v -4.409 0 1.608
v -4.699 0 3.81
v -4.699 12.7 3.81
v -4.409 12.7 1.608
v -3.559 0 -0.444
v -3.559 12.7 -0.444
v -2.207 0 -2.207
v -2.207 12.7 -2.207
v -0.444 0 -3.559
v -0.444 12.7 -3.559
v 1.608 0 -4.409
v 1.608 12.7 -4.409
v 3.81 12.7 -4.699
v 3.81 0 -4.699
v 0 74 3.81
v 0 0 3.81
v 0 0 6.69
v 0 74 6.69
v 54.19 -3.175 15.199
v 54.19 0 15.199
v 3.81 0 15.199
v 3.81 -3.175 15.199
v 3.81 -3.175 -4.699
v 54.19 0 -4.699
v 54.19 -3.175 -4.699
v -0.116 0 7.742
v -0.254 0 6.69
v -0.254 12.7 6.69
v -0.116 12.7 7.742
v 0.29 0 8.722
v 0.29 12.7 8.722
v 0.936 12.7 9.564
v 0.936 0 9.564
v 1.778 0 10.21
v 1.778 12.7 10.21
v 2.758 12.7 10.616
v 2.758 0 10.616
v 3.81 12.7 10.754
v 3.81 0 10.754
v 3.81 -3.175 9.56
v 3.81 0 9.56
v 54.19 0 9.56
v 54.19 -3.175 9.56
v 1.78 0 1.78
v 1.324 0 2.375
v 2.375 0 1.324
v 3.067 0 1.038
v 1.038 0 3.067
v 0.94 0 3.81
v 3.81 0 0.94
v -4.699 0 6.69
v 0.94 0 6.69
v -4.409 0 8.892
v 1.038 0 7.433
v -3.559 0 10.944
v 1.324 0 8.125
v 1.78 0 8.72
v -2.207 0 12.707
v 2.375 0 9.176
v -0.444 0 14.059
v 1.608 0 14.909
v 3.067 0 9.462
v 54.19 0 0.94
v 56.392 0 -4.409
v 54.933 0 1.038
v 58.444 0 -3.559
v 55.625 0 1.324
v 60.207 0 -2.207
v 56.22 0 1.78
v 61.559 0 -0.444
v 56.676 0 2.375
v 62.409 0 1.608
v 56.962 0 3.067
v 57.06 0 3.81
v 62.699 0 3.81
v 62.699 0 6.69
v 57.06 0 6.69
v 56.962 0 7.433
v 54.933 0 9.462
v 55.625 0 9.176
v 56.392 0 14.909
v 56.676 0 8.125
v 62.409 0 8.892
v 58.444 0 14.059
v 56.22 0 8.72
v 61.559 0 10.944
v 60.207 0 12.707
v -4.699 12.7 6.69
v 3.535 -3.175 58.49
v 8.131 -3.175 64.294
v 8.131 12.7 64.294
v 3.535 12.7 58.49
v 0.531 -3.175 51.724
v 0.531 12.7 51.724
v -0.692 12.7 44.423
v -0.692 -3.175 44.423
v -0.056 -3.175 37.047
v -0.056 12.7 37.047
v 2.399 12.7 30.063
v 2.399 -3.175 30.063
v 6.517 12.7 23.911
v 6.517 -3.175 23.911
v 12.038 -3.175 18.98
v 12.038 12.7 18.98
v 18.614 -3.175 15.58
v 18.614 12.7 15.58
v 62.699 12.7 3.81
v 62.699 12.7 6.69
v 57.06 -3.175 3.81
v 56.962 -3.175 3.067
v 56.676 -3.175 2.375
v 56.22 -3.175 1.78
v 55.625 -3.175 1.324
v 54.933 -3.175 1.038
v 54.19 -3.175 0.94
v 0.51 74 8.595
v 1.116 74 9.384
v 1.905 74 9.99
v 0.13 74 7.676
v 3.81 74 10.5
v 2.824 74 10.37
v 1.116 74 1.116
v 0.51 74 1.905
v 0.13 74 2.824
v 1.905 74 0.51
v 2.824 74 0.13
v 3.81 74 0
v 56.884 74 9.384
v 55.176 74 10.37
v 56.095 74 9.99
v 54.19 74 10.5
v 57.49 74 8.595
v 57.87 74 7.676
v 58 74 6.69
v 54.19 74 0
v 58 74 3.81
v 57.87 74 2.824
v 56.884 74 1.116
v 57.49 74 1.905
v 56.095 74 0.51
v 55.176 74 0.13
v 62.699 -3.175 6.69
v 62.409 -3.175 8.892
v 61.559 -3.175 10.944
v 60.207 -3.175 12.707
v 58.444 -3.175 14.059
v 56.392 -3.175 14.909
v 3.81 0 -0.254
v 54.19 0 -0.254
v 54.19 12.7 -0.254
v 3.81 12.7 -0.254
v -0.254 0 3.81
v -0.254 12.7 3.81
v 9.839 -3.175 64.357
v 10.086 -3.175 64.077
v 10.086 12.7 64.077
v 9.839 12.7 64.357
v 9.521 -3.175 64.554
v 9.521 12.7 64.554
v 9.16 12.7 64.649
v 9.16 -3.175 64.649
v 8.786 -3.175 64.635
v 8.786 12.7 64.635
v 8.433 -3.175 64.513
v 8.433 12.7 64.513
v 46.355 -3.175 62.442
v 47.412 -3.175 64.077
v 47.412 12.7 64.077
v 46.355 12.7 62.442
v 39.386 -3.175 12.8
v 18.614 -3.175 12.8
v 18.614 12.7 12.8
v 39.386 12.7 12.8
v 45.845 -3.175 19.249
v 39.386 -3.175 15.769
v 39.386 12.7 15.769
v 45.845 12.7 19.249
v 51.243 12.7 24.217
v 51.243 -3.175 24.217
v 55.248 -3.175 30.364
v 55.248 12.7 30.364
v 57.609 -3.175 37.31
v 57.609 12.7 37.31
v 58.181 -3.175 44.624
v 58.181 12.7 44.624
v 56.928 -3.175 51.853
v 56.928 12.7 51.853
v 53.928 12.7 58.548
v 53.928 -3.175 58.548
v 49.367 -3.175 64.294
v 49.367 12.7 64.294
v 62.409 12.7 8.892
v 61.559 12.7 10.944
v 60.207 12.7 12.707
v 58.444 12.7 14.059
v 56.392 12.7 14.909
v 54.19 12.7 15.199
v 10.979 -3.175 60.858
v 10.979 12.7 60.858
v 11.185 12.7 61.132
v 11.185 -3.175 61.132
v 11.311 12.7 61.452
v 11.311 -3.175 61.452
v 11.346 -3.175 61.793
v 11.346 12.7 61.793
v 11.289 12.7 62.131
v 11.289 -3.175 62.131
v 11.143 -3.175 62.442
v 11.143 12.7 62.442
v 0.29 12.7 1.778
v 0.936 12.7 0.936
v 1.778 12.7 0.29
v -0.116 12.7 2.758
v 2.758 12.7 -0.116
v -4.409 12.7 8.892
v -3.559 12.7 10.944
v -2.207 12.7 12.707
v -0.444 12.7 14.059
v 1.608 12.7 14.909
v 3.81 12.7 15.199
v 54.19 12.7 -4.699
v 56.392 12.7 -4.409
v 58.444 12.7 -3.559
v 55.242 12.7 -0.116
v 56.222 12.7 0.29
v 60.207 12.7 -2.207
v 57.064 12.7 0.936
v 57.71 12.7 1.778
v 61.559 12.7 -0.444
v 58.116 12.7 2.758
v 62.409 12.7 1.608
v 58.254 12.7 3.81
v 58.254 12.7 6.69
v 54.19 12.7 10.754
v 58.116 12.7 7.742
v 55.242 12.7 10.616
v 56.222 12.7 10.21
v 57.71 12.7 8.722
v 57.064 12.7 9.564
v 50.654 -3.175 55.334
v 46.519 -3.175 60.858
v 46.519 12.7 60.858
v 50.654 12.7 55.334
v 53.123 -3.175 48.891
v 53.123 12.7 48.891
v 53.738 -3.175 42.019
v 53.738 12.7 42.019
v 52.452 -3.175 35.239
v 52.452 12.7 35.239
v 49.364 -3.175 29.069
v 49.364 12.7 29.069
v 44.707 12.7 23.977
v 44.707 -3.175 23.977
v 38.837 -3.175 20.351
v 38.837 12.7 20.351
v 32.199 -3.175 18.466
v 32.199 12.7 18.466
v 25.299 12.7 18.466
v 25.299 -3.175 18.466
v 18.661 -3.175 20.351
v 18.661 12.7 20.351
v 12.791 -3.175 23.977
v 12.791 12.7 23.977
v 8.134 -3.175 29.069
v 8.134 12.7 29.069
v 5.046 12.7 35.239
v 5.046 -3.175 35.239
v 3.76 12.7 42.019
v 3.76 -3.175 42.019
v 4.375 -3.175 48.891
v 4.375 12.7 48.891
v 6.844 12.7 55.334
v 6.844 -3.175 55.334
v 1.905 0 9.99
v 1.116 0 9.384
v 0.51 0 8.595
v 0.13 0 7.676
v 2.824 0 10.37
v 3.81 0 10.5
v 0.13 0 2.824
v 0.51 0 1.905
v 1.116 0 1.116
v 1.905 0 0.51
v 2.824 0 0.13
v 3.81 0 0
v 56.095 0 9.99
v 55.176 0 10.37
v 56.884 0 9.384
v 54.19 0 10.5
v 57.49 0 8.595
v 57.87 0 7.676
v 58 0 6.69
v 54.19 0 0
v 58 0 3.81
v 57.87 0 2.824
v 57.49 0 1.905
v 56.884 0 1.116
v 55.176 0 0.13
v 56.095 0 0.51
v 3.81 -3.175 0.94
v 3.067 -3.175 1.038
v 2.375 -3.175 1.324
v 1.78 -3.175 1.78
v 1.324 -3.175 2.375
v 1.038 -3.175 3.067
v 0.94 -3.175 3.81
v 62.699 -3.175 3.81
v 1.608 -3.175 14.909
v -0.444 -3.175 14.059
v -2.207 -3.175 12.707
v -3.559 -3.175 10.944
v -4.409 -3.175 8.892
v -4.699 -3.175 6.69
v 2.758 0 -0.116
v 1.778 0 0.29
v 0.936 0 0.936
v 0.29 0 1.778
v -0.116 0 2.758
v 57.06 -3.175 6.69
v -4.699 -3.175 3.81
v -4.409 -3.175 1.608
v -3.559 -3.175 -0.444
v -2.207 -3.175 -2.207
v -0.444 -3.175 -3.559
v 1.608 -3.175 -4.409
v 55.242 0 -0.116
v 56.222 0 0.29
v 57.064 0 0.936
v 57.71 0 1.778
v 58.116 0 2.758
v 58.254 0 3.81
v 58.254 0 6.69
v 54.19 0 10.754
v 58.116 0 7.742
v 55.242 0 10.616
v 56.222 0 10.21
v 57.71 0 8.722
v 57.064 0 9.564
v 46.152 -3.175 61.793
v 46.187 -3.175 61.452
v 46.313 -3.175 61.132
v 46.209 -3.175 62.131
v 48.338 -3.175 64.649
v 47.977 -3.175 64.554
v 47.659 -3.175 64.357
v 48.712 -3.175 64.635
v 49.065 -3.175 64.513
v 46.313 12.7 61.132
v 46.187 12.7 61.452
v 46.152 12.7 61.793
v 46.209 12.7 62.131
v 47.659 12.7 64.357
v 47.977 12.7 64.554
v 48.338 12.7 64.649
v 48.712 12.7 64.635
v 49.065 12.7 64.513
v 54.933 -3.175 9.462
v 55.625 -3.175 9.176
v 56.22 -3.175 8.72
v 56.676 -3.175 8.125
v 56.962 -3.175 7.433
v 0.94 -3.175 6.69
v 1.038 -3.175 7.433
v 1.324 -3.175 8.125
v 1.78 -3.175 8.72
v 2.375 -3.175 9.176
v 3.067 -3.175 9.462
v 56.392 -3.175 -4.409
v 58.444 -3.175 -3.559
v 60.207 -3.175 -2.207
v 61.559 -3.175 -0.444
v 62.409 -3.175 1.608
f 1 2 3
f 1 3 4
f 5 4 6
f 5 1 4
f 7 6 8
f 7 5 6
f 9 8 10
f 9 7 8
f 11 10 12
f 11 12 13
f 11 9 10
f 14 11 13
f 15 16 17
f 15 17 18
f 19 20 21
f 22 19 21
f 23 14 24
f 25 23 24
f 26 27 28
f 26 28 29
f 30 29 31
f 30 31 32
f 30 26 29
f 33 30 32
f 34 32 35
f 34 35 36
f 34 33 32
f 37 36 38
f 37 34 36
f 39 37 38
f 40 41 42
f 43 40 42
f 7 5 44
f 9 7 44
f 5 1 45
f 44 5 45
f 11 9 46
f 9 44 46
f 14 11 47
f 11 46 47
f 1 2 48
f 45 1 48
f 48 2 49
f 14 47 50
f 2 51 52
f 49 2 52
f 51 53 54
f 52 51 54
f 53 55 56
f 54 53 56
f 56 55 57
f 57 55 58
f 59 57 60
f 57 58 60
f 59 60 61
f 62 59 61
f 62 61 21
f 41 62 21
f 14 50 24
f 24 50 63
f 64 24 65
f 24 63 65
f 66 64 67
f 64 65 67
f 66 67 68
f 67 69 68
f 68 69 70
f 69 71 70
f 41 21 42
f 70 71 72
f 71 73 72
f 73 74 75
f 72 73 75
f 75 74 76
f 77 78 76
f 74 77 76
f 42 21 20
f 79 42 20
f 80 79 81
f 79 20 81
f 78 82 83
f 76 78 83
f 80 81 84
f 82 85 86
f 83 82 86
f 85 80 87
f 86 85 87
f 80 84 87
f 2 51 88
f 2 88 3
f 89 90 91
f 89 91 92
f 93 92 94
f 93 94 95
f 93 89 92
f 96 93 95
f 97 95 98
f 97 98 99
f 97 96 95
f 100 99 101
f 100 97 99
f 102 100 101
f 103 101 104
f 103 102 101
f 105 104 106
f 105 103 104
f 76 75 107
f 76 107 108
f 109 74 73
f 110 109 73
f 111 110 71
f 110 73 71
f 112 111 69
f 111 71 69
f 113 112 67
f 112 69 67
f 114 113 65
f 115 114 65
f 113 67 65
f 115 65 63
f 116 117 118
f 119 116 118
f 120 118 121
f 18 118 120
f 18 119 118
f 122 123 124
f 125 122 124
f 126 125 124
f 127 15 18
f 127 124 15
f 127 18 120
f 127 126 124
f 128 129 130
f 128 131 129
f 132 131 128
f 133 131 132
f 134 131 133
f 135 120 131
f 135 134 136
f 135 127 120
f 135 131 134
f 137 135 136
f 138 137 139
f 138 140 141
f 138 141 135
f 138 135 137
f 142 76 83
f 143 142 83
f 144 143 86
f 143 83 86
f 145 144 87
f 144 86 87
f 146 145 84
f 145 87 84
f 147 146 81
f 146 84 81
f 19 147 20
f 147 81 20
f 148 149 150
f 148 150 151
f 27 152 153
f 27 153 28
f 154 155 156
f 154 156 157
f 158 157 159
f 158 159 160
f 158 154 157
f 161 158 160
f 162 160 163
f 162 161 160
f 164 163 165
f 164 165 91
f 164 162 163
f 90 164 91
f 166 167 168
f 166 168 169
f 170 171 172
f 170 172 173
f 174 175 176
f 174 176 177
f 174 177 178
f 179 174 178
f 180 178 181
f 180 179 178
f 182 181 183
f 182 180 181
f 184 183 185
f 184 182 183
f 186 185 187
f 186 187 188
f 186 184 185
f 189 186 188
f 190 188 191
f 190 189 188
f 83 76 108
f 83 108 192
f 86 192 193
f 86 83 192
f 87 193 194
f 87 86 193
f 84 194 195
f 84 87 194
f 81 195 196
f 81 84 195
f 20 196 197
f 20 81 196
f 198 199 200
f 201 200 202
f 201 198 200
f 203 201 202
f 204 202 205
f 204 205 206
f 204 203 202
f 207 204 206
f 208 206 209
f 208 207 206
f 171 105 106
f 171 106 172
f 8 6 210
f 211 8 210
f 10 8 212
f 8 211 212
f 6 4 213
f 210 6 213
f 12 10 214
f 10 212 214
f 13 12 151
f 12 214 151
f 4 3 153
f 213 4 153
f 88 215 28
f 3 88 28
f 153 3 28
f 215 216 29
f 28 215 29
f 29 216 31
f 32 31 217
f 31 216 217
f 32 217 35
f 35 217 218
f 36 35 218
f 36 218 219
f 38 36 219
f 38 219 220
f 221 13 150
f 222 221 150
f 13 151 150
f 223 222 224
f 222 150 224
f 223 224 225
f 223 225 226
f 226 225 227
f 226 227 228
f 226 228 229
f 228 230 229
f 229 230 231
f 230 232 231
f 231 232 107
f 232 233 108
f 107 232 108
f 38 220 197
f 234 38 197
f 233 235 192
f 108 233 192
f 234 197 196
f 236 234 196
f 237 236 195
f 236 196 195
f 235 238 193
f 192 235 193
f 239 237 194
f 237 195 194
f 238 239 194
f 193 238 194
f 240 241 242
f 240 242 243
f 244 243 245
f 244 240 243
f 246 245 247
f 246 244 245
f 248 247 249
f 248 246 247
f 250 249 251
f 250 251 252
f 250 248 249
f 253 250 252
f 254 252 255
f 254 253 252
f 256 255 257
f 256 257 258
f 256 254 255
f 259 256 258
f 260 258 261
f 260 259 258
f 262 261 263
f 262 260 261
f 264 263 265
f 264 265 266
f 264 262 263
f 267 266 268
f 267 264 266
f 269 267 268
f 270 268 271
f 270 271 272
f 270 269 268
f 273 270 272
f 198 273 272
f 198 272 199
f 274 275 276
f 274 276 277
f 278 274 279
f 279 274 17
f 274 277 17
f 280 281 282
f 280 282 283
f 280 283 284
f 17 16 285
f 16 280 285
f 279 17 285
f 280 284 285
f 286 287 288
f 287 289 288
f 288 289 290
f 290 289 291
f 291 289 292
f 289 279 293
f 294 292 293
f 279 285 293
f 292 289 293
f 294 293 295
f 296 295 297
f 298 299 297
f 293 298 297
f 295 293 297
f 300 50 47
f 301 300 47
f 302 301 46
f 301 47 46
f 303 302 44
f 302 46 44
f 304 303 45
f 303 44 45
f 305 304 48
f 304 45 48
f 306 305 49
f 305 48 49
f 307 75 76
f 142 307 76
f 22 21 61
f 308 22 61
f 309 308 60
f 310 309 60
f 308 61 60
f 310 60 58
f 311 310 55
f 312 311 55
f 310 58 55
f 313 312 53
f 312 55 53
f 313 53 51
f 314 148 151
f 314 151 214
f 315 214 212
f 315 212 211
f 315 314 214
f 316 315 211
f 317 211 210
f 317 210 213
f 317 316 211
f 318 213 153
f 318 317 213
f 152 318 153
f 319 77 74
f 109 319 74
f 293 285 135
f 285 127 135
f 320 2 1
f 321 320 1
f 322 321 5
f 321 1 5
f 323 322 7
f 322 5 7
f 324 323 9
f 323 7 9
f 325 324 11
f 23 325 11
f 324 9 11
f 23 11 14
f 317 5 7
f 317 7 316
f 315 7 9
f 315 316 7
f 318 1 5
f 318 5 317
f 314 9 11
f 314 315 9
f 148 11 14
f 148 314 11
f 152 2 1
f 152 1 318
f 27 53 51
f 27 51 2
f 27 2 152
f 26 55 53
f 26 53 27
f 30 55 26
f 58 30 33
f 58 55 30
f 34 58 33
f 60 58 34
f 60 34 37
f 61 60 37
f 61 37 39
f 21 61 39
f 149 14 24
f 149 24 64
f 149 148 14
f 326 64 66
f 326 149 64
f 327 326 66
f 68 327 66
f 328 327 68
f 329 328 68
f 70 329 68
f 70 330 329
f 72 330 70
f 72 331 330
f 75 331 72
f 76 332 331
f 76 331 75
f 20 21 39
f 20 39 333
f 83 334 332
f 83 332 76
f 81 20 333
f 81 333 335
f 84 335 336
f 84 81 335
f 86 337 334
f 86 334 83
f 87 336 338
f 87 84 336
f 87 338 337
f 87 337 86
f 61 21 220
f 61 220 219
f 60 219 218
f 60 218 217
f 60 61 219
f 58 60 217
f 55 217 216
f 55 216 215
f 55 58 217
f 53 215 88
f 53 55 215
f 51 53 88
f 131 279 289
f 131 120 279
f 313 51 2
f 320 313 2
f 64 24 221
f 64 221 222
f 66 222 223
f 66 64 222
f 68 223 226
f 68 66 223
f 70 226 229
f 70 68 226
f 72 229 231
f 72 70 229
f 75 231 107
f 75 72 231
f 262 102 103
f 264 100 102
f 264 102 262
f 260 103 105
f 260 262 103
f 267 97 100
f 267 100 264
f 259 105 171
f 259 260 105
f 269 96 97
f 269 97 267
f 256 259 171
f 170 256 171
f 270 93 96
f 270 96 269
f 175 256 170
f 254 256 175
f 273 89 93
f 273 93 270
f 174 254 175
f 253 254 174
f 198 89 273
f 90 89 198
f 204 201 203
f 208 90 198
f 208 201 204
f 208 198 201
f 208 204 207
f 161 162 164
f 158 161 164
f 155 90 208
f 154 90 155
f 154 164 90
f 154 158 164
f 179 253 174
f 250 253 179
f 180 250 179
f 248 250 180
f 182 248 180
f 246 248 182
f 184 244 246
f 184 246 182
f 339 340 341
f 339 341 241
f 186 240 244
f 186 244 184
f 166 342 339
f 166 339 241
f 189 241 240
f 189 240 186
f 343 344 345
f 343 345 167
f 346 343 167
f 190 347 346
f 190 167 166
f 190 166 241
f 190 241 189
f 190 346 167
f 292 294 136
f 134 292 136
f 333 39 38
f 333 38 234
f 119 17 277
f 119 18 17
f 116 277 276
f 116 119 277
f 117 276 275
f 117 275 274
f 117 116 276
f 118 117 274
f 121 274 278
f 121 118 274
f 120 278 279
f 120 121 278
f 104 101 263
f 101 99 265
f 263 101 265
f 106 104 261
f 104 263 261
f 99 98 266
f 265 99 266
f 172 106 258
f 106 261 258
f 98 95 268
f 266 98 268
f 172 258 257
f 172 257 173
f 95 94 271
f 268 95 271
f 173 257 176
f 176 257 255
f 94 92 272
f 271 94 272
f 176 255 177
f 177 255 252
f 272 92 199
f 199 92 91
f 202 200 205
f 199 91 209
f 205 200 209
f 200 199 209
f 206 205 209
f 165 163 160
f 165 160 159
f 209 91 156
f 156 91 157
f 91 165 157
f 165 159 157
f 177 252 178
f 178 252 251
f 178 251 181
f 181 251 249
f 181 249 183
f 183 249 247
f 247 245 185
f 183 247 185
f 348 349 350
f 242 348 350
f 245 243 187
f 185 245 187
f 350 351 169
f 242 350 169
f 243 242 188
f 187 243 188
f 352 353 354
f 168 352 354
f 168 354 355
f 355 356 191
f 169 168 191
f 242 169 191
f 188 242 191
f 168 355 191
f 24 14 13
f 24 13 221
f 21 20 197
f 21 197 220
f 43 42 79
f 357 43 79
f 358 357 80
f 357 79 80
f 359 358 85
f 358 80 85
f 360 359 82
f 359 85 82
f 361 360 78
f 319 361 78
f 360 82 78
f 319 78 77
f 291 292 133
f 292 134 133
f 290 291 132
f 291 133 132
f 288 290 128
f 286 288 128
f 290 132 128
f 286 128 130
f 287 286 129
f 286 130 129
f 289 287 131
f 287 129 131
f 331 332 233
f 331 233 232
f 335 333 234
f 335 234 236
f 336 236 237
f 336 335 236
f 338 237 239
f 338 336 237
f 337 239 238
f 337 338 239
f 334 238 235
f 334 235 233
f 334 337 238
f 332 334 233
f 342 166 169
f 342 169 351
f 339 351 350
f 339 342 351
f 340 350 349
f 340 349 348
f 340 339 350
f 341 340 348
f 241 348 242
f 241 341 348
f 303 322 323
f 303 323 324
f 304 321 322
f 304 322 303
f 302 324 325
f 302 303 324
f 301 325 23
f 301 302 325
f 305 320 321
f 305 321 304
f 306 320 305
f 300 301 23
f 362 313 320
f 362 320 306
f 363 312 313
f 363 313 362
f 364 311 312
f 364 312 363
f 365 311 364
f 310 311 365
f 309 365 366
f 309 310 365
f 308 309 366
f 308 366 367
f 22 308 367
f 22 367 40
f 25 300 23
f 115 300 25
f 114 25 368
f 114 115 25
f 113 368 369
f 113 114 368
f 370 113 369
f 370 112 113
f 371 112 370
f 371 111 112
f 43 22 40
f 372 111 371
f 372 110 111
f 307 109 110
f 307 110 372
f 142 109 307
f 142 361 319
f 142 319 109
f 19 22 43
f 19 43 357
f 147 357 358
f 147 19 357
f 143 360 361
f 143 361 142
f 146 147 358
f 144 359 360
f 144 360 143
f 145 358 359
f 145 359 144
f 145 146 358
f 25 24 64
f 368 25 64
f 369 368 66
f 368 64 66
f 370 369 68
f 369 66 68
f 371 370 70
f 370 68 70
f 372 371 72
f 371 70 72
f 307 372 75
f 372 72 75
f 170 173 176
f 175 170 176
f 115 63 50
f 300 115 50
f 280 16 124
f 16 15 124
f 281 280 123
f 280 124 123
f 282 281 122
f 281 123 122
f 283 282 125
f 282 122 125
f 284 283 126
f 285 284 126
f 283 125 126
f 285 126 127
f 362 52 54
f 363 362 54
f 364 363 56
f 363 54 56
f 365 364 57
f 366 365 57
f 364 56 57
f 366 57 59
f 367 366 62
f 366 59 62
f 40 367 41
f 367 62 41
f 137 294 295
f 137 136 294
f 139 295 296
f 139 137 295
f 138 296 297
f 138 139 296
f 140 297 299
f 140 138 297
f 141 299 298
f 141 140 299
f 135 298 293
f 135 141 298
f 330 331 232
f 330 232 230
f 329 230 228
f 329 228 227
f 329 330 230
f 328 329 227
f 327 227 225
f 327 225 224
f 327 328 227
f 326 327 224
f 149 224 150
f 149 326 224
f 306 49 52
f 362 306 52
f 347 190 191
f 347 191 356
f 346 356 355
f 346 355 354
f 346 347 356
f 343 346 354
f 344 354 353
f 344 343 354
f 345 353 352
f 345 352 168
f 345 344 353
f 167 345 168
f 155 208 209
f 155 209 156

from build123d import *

# Parameters (mm, degrees)
F0_W     = 58
F0_H     = 74
F1_DEPTH = 10.5
F2_R     = 3.81
F4_DEPTH = 12.7
F6_DEPTH = 3.175
F8_DEPTH = 15.875


with BuildPart() as f1:
    # F0 (on Top) → F1 (new body)
    with BuildSketch(Plane.XY):
        with Locations((29, 37)):
            Rectangle(F0_W, F0_H)
    extrude(amount=F1_DEPTH)

    # F2
    f2_edges = [f1.edges().sort_by_distance(p)[0] for p in [
        (58, 37, 0),
        (58, 37, 10.5),
        (0, 37, 0),
        (0, 37, 10.5),
    ]]
    fillet(f2_edges, radius=F2_R)


with BuildPart() as f4:
    # F3 (on face) → F4 (new body)
    with BuildSketch(Plane.XZ):
        with BuildLine():
            Line((54.19, 15.199), (3.81, 15.199))
            ThreePointArc((3.81, 15.199), (-2.2067716011, 12.7067716011), (-4.699, 6.69))
            Line((-4.699, 6.69), (-4.699, 3.81))
            ThreePointArc((-4.699, 3.81), (-2.2067716011, -2.2067716011), (3.81, -4.699))
            Line((3.81, -4.699), (54.19, -4.699))
            ThreePointArc((54.19, -4.699), (60.2067716011, -2.2067716011), (62.699, 3.81))
            Line((62.699, 3.81), (62.699, 6.69))
            ThreePointArc((62.699, 6.69), (60.2067716011, 12.7067716011), (54.19, 15.199))
        make_face()
        with BuildLine():
            ThreePointArc((-0.254, 6.69), (0.9363180413, 9.5636819587), (3.81, 10.754))
            Line((3.81, 10.754), (54.19, 10.754))
            ThreePointArc((54.19, 10.754), (57.0636819587, 9.5636819587), (58.254, 6.69))
            Line((58.254, 6.69), (58.254, 3.81))
            ThreePointArc((58.254, 3.81), (57.0636819587, 0.9363180413), (54.19, -0.254))
            Line((54.19, -0.254), (3.81, -0.254))
            ThreePointArc((3.81, -0.254), (0.9363180413, 0.9363180413), (-0.254, 3.81))
            Line((-0.254, 3.81), (-0.254, 6.69))
        make_face(mode=Mode.SUBTRACT)
    extrude(amount=-F4_DEPTH)


with BuildPart() as f6:
    # F5 (on face) → F6 (new body)
    with BuildSketch(Plane.XZ):
        with BuildLine():
            ThreePointArc((62.699, 6.69), (60.2067716011, 12.7067716011), (54.19, 15.199))
            Line((54.19, 15.199), (3.81, 15.199))
            ThreePointArc((3.81, 15.199), (-2.2067716011, 12.7067716011), (-4.699, 6.69))
            Line((-4.699, 6.69), (-4.699, 3.81))
            ThreePointArc((-4.699, 3.81), (-2.2067716011, -2.2067716011), (3.81, -4.699))
            Line((3.81, -4.699), (54.19, -4.699))
            ThreePointArc((54.19, -4.699), (60.2067716011, -2.2067716011), (62.699, 3.81))
            Line((62.699, 3.81), (62.699, 6.69))
        make_face()
        with BuildLine():
            ThreePointArc((3.81, -0.254), (0.9363180413, 0.9363180413), (-0.254, 3.81))
            Line((-0.254, 3.81), (-0.254, 6.69))
            ThreePointArc((-0.254, 6.69), (0.9363180413, 9.5636819587), (3.81, 10.754))
            Line((3.81, 10.754), (54.19, 10.754))
            ThreePointArc((54.19, 10.754), (57.0636819587, 9.5636819587), (58.254, 6.69))
            Line((58.254, 6.69), (58.254, 3.81))
            ThreePointArc((58.254, 3.81), (57.0636819587, 0.9363180413), (54.19, -0.254))
            Line((54.19, -0.254), (3.81, -0.254))
        make_face(mode=Mode.SUBTRACT)
        with BuildLine():
            Line((-0.254, 6.69), (-0.254, 3.81))
            ThreePointArc((-0.254, 3.81), (0.9363180413, 0.9363180413), (3.81, -0.254))
            Line((3.81, -0.254), (54.19, -0.254))
            ThreePointArc((54.19, -0.254), (57.0636819587, 0.9363180413), (58.254, 3.81))
            Line((58.254, 3.81), (58.254, 6.69))
            ThreePointArc((58.254, 6.69), (57.0636819587, 9.5636819587), (54.19, 10.754))
            Line((54.19, 10.754), (3.81, 10.754))
            ThreePointArc((3.81, 10.754), (0.9363180413, 9.5636819587), (-0.254, 6.69))
        make_face()
        with BuildLine():
            Line((3.81, 9.5602003321), (54.19, 9.5602003321))
            ThreePointArc((54.19, 9.5602003321), (56.2195381182, 8.7195381182), (57.0602003321, 6.69))
            Line((57.0602003321, 6.69), (57.0602003321, 3.81))
            ThreePointArc((57.0602003321, 3.81), (56.2195381182, 1.7804618818), (54.19, 0.9397996679))
            Line((54.19, 0.9397996679), (3.81, 0.9397996679))
            ThreePointArc((3.81, 0.9397996679), (1.7804618818, 1.7804618818), (0.9397996679, 3.81))
            Line((0.9397996679, 3.81), (0.9397996679, 6.69))
            ThreePointArc((0.9397996679, 6.69), (1.7804618818, 8.7195381182), (3.81, 9.5602003321))
        make_face(mode=Mode.SUBTRACT)
    extrude(amount=F6_DEPTH)


with BuildPart() as f8:
    # F7 (on face) → F8 (new body)
    with BuildSketch(Plane.XZ.offset(3.175)):
        with BuildLine():
            ThreePointArc((46.5190580061, 60.858109749), (28.748975634, 18.2273379186), (10.9788907227, 60.8581086906))
            ThreePointArc((10.9788907227, 60.8581086906), (11.3400798422, 61.6210900026), (11.1431619079, 62.4419562461))
            Line((11.1431619079, 62.4419562461), (10.0855654762, 64.0766926394))
            ThreePointArc((10.0855654762, 64.0766926394), (9.1596065709, 64.6490649425), (8.1305336461, 64.2940735858))
            ThreePointArc((8.1305336461, 64.2940735858), (-0.0555666287, 37.0474925456), (18.6139133123, 15.5803330961))
            Line((18.6139133123, 15.5803330961), (18.6139133123, 17.4656958604))
            Line((18.6139133123, 17.4656958604), (39.3860866877, 17.4656958604))
            Line((39.3860866877, 17.4656958604), (39.3860866877, 15.7694540236))
            ThreePointArc((39.3860866877, 15.7694540236), (57.6087580673, 37.3099913236), (49.367414878, 64.2940748139))
            ThreePointArc((49.367414878, 64.2940748139), (48.3383419322, 64.6490661093), (47.4123830609, 64.076693751))
            Line((47.4123830609, 64.076693751), (46.3547867266, 62.4419572948))
            ThreePointArc((46.3547867266, 62.4419572948), (46.1578688412, 61.6210910396), (46.5190580061, 60.858109749))
        make_face()
        with BuildLine():
            Line((18.6139133123, 17.4656958604), (18.6139133123, 15.5803330961))
            ThreePointArc((18.6139133123, 15.5803330961), (29.0172197168, 13.7835590152), (39.3860866877, 15.7694540236))
            Line((39.3860866877, 15.7694540236), (39.3860866877, 17.4656958604))
            Line((39.3860866877, 17.4656958604), (18.6139133123, 17.4656958604))
        make_face()
        with BuildLine():
            ThreePointArc((39.3860866877, 15.7694540236), (29.0172197168, 13.7835590152), (18.6139133123, 15.5803330961))
            Line((18.6139133123, 15.5803330961), (18.6139133123, 12.800030257))
            Line((18.6139133123, 12.800030257), (39.3860866877, 12.800030257))
            Line((39.3860866877, 12.800030257), (39.3860866877, 15.7694540236))
        make_face()
    extrude(amount=-F8_DEPTH)


solid = Compound([f1.part, f4.part, f6.part, f8.part])
